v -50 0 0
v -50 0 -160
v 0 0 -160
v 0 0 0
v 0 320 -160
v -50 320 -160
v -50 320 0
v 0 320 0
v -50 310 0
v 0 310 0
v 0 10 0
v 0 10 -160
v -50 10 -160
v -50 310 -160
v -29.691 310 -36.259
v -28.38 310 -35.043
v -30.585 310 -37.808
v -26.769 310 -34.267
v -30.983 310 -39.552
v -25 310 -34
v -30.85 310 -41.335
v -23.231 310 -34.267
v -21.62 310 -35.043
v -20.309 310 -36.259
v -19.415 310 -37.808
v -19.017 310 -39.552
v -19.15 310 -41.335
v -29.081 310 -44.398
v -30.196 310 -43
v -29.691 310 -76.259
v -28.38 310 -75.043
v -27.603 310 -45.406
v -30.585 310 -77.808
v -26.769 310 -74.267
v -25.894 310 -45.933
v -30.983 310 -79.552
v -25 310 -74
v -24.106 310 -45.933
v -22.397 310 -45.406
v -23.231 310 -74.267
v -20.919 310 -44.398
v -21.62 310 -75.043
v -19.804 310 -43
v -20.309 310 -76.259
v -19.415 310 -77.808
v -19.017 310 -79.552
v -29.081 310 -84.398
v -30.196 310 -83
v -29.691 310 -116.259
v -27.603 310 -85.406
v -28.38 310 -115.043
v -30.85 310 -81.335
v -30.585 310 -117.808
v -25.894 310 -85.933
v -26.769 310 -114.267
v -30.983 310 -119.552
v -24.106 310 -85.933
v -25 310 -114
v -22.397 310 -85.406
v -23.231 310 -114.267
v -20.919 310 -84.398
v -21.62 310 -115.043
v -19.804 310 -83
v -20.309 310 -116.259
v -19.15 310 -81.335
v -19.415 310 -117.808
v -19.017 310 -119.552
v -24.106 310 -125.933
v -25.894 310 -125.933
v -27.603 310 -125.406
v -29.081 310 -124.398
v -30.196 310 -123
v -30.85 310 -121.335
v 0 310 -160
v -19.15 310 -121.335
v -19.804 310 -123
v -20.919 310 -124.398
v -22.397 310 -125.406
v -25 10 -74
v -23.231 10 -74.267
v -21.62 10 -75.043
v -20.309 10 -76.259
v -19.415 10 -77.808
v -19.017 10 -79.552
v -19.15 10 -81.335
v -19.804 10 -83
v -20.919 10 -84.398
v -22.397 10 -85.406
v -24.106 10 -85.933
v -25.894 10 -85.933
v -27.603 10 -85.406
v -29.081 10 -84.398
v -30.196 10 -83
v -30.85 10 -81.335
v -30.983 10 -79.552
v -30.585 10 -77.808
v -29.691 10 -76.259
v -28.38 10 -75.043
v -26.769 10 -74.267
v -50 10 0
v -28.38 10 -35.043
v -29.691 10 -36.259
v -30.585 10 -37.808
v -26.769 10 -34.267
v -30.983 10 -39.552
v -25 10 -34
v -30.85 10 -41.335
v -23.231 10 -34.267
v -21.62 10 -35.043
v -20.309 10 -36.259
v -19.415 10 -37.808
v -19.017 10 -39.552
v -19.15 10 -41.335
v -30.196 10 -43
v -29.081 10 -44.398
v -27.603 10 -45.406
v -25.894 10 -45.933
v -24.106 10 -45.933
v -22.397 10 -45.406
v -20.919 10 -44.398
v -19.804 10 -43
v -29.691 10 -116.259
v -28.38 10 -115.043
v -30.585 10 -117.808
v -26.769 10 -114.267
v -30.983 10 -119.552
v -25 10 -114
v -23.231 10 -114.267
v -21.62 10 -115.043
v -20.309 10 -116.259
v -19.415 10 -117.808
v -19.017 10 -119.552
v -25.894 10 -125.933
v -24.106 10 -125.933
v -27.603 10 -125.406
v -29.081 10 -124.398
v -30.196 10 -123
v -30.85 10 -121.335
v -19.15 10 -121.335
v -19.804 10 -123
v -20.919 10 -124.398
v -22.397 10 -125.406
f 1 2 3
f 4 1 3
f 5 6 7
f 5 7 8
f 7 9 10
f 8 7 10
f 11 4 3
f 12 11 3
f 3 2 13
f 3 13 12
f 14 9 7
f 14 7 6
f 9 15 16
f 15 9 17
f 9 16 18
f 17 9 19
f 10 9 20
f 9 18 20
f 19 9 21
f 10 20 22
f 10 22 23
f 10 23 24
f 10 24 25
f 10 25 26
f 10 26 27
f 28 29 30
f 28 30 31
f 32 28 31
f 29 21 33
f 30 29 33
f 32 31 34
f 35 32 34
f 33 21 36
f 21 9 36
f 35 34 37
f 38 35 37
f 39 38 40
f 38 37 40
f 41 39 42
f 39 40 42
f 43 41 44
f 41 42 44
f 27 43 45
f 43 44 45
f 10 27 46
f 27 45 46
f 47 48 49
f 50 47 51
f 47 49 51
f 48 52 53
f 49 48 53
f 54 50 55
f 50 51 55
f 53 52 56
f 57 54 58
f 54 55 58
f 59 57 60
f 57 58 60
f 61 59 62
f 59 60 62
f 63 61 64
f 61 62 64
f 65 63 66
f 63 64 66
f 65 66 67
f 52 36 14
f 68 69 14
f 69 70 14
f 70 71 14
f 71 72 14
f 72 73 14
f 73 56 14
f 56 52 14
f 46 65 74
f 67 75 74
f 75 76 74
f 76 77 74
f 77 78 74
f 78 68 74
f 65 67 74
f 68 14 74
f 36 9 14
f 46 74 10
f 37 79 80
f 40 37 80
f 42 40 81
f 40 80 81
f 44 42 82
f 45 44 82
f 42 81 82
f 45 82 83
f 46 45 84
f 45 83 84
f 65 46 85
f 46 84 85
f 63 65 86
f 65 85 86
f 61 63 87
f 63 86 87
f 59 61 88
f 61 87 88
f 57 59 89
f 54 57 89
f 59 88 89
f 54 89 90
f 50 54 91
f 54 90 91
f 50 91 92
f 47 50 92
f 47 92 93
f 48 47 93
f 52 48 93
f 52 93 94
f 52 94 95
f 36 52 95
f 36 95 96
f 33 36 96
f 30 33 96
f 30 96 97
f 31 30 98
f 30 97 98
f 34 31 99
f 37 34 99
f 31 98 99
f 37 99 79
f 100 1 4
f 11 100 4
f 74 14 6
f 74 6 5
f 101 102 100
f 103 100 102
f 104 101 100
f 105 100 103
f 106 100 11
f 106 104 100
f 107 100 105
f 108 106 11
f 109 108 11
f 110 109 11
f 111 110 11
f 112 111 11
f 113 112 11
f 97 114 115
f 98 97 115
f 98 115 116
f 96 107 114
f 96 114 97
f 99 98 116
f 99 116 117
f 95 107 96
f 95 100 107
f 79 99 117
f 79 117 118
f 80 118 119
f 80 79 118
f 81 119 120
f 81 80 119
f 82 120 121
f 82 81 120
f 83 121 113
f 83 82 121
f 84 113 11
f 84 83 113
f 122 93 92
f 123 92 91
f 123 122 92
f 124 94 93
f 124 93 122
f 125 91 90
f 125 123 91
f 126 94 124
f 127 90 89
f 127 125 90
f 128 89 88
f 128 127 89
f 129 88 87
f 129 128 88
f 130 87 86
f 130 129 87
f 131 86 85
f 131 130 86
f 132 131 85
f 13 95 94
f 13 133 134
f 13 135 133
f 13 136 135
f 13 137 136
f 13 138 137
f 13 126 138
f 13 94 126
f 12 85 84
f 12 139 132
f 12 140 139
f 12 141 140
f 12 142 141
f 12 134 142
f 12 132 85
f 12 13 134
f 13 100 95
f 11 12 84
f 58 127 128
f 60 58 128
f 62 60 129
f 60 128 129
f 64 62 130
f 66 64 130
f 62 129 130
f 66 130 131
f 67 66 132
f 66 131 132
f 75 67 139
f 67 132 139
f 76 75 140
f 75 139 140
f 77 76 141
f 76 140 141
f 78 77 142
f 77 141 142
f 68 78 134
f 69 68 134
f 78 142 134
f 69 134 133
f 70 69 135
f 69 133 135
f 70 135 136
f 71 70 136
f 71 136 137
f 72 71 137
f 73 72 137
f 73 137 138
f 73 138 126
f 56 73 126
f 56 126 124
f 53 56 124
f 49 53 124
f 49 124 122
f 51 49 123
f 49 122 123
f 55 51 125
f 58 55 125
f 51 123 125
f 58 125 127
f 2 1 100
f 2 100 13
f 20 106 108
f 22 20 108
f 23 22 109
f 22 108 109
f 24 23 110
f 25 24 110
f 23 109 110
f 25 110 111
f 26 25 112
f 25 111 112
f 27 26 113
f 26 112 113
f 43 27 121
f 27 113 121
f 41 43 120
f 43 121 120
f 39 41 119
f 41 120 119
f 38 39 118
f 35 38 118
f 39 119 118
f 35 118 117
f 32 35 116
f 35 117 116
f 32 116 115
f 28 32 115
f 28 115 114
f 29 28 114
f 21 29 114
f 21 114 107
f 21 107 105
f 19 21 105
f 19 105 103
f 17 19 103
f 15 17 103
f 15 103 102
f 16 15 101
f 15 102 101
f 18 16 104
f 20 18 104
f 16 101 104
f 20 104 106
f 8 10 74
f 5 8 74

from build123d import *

# Parameters (mm, degrees)
SKETCH_1_W      = 50
SKETCH_1_H      = 160
EXTRUDE_1_DEPTH = 10
SKETCH_2_R      = 6
EXTRUDE_2_DEPTH = 300
SKETCH_3_W      = 50
SKETCH_3_H      = 160
EXTRUDE_3_DEPTH = 10


with BuildPart() as part:
    # 草图1 → 凸台-拉伸1 (new body)
    with BuildSketch(Plane(origin=(0, 0, 0), x_dir=(1, 0, 0), z_dir=(0, 1, 0))):
        with Locations((-25, 80)):
            Rectangle(SKETCH_1_W, SKETCH_1_H)
    extrude(amount=EXTRUDE_1_DEPTH)

    # 草图2 → 凸台-拉伸2 (add)
    with BuildSketch(Plane(origin=(0, 10, 0), x_dir=(1, 0, 0), z_dir=(0, 1, 0))):
        with Locations(Location((-25, 120, 0), (0, 0, 270))):
            Circle(SKETCH_2_R)
        with Locations(Location((-25, 80, 0), (0, 0, 270))):
            Circle(SKETCH_2_R)
        with Locations(Location((-25, 40, 0), (0, 0, 270))):
            Circle(SKETCH_2_R)
    extrude(amount=EXTRUDE_2_DEPTH)

    # 草图3 → 凸台-拉伸3 (add)
    with BuildSketch(Plane(origin=(0, 310, 0), x_dir=(1, 0, 0), z_dir=(0, 1, 0))):
        with Locations((-25, 80)):
            Rectangle(SKETCH_3_W, SKETCH_3_H)
    extrude(amount=EXTRUDE_3_DEPTH)


solid = part.part
